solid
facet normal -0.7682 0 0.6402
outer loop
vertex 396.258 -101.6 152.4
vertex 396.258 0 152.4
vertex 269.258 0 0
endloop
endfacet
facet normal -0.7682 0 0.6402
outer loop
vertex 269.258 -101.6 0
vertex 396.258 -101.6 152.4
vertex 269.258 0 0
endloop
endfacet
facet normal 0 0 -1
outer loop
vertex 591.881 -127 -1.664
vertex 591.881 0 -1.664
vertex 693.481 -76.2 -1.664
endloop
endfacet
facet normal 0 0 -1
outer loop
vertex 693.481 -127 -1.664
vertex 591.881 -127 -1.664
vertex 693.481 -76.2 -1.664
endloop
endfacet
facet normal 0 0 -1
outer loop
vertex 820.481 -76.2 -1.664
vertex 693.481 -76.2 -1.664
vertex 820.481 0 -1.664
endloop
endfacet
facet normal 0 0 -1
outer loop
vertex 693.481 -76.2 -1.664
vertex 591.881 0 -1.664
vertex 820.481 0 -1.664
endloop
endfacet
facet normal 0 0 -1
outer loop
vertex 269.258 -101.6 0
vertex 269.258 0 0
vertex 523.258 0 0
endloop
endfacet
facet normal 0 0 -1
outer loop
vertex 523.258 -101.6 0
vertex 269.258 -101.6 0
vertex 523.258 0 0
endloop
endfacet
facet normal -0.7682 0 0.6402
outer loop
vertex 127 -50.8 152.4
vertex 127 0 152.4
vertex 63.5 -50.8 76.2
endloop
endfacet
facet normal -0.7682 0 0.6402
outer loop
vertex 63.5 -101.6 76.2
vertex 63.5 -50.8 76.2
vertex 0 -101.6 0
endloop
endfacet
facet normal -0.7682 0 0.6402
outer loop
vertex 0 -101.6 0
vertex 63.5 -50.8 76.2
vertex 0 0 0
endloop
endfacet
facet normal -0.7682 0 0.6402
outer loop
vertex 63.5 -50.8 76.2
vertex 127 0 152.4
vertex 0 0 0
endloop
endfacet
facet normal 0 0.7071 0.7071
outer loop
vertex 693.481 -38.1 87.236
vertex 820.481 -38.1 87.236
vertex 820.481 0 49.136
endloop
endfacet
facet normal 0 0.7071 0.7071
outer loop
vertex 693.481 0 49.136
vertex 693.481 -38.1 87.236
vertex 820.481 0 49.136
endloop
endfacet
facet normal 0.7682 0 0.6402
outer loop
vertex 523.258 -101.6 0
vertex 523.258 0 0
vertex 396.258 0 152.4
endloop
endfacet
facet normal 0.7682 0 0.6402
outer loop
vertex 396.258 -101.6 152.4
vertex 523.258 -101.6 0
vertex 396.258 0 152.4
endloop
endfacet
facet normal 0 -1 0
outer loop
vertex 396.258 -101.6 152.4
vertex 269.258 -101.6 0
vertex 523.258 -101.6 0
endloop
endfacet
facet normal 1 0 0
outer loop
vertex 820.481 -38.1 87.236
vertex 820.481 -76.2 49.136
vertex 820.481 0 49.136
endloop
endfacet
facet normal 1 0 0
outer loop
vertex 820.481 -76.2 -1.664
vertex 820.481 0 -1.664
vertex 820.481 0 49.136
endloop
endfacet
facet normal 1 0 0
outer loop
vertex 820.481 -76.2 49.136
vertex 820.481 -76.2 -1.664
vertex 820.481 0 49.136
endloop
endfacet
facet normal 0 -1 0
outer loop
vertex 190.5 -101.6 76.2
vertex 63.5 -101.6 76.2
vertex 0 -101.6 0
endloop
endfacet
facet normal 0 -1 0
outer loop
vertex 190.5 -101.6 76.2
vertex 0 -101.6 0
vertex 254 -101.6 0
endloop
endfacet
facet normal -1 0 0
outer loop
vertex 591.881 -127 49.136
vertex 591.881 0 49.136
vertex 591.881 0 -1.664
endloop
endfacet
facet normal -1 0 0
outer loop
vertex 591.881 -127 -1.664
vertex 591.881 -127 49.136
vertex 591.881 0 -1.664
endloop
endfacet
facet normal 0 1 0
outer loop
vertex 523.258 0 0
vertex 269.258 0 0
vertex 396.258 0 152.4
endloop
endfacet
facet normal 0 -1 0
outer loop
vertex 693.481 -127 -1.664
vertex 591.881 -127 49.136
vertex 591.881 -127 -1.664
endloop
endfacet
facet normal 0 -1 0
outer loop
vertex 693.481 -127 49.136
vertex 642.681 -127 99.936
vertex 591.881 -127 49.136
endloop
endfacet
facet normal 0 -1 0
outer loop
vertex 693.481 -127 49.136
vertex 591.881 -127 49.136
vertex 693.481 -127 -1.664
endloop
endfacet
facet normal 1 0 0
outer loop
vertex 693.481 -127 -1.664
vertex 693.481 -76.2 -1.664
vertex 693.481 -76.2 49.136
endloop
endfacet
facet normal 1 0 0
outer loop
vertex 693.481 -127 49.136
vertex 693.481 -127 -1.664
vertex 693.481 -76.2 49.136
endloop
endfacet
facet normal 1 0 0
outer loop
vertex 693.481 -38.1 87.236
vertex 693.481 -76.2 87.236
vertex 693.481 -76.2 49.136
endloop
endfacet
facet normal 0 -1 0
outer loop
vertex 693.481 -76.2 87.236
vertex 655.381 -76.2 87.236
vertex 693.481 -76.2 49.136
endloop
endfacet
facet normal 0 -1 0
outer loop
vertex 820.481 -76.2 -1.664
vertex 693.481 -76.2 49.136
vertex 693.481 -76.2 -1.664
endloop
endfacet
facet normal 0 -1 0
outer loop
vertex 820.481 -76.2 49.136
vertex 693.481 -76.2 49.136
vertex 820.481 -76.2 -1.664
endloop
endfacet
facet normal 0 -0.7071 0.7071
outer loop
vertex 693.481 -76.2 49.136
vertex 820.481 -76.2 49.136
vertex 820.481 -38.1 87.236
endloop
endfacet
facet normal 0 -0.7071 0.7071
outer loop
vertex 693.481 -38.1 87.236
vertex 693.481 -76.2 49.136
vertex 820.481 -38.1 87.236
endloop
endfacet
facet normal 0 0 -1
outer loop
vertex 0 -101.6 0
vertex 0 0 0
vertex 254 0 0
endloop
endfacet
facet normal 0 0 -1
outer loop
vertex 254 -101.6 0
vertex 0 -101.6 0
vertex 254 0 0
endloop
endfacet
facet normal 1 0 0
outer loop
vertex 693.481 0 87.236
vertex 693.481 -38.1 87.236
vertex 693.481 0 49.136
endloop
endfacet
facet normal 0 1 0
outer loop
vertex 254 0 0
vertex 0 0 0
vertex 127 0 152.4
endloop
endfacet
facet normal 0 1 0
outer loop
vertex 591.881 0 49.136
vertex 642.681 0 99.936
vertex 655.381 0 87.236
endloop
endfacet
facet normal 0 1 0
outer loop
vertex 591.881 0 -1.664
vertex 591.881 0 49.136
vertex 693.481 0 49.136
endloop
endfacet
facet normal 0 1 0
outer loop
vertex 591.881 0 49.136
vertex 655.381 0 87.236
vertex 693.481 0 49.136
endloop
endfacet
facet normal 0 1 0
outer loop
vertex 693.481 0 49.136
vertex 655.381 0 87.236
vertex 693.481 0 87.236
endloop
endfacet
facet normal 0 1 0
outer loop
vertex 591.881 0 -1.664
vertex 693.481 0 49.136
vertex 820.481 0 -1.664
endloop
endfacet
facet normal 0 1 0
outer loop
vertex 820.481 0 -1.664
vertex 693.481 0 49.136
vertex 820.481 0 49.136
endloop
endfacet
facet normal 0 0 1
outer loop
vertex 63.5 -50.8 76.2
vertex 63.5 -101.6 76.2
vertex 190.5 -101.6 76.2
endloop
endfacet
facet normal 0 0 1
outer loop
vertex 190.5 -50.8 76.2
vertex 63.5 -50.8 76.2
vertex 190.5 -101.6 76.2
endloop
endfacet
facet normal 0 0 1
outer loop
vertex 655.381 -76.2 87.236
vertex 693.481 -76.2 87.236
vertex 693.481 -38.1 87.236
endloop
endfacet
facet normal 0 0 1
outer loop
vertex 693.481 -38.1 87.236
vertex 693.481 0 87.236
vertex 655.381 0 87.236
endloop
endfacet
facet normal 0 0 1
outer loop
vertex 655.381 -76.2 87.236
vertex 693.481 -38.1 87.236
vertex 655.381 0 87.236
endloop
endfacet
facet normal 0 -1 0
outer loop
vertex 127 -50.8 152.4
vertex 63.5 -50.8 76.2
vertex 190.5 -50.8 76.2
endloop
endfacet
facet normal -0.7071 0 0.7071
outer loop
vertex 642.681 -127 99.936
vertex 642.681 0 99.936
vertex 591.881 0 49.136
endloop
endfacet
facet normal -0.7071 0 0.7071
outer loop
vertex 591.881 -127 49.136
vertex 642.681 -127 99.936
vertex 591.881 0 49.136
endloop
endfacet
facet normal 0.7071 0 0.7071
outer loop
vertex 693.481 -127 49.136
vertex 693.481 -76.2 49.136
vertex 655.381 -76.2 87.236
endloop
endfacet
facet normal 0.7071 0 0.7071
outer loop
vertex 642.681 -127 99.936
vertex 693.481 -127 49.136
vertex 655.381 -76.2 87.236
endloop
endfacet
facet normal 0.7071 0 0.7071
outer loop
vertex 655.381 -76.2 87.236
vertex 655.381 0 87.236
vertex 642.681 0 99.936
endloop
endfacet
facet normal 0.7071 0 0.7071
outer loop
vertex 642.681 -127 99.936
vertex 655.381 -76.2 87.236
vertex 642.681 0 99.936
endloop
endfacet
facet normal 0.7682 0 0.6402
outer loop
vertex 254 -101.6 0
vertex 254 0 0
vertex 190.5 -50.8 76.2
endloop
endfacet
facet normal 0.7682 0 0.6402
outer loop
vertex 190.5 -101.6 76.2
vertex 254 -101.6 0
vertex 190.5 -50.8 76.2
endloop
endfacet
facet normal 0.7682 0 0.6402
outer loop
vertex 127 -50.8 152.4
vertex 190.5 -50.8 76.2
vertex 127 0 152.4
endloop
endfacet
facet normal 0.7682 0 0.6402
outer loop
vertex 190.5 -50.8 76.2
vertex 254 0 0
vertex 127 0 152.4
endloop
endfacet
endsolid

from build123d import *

# Parameters (mm, degrees)
F1_DEPTH  = 101.6
F3_DEPTH  = 50.8
F5_DEPTH  = 101.6
F7_DEPTH  = 127
F6_W      = 127
F6_H      = 50.8
F8_DEPTH  = 76.2
F9_DEPTH  = 76.2
F11_DEPTH = 127
F13_DEPTH = 127


with BuildPart() as f1:
    # F0 (on Front) → F1 (new body)
    with BuildSketch(Plane.XZ):
        Polygon((127, 152.4), (0, 0), (254, 0), align=None)
    extrude(amount=F1_DEPTH)

    # F2 (on face) → F3 (cut)
    with BuildSketch(Plane.XZ.offset(101.6)):
        Polygon((63.5, 76.2), (127, 76.2), (190.5, 76.2), (127, 152.4), align=None)
    extrude(amount=-F3_DEPTH, mode=Mode.SUBTRACT)


with BuildPart() as f5:
    # F4 (on Front) → F5 (new body)
    with BuildSketch(Plane.XZ):
        Polygon((396.2579253727, 152.4), (269.2579253727, 0), (523.2579253727, 0), align=None)
    extrude(amount=F5_DEPTH)


with BuildPart() as f7:
    # F6 (on Front) → F7 (new body)
    with BuildSketch(Plane.XZ):
        Polygon((591.8814198494, 49.1360899748), (591.8814198494, -1.6639100252), (693.4814198494, -1.6639100252), (693.4814198494, 49.1360899748), (655.3814198494, 87.2360899748), (642.6814198494, 99.9360899748), align=None)
    extrude(amount=F7_DEPTH)

    # F6 (on Front) → F8 (join)
    with BuildSketch(Plane.XZ):
        with Locations((756.9814198494, 23.7360899748)):
            Rectangle(F6_W, F6_H)
    extrude(amount=F8_DEPTH)

    # F6 (on Front) → F9 (join)
    with BuildSketch(Plane.XZ):
        Polygon((655.3814198494, 87.2360899748), (693.4814198494, 49.1360899748), (820.4814198494, 49.1360899748), (820.4814198494, 87.2360899748), align=None)
    extrude(amount=F9_DEPTH)

    # F10 (on face) → F11 (cut)
    with BuildSketch(Plane.YZ.offset(820.4814198494)):
        Polygon((-76.2, 87.2360899748), (-76.2, 49.1362325847), (-38.1, 87.2360899748), align=None)
    extrude(amount=-F11_DEPTH, mode=Mode.SUBTRACT)

    # F12 (on face) → F13 (cut)
    with BuildSketch(Plane.YZ.offset(820.4814198494)):
        Polygon((0, 87.2360899748), (-38.1, 87.2360899748), (0, 49.1362325847), align=None)
    extrude(amount=-F13_DEPTH, mode=Mode.SUBTRACT)


solid = Compound([f1.part, f5.part, f7.part])
